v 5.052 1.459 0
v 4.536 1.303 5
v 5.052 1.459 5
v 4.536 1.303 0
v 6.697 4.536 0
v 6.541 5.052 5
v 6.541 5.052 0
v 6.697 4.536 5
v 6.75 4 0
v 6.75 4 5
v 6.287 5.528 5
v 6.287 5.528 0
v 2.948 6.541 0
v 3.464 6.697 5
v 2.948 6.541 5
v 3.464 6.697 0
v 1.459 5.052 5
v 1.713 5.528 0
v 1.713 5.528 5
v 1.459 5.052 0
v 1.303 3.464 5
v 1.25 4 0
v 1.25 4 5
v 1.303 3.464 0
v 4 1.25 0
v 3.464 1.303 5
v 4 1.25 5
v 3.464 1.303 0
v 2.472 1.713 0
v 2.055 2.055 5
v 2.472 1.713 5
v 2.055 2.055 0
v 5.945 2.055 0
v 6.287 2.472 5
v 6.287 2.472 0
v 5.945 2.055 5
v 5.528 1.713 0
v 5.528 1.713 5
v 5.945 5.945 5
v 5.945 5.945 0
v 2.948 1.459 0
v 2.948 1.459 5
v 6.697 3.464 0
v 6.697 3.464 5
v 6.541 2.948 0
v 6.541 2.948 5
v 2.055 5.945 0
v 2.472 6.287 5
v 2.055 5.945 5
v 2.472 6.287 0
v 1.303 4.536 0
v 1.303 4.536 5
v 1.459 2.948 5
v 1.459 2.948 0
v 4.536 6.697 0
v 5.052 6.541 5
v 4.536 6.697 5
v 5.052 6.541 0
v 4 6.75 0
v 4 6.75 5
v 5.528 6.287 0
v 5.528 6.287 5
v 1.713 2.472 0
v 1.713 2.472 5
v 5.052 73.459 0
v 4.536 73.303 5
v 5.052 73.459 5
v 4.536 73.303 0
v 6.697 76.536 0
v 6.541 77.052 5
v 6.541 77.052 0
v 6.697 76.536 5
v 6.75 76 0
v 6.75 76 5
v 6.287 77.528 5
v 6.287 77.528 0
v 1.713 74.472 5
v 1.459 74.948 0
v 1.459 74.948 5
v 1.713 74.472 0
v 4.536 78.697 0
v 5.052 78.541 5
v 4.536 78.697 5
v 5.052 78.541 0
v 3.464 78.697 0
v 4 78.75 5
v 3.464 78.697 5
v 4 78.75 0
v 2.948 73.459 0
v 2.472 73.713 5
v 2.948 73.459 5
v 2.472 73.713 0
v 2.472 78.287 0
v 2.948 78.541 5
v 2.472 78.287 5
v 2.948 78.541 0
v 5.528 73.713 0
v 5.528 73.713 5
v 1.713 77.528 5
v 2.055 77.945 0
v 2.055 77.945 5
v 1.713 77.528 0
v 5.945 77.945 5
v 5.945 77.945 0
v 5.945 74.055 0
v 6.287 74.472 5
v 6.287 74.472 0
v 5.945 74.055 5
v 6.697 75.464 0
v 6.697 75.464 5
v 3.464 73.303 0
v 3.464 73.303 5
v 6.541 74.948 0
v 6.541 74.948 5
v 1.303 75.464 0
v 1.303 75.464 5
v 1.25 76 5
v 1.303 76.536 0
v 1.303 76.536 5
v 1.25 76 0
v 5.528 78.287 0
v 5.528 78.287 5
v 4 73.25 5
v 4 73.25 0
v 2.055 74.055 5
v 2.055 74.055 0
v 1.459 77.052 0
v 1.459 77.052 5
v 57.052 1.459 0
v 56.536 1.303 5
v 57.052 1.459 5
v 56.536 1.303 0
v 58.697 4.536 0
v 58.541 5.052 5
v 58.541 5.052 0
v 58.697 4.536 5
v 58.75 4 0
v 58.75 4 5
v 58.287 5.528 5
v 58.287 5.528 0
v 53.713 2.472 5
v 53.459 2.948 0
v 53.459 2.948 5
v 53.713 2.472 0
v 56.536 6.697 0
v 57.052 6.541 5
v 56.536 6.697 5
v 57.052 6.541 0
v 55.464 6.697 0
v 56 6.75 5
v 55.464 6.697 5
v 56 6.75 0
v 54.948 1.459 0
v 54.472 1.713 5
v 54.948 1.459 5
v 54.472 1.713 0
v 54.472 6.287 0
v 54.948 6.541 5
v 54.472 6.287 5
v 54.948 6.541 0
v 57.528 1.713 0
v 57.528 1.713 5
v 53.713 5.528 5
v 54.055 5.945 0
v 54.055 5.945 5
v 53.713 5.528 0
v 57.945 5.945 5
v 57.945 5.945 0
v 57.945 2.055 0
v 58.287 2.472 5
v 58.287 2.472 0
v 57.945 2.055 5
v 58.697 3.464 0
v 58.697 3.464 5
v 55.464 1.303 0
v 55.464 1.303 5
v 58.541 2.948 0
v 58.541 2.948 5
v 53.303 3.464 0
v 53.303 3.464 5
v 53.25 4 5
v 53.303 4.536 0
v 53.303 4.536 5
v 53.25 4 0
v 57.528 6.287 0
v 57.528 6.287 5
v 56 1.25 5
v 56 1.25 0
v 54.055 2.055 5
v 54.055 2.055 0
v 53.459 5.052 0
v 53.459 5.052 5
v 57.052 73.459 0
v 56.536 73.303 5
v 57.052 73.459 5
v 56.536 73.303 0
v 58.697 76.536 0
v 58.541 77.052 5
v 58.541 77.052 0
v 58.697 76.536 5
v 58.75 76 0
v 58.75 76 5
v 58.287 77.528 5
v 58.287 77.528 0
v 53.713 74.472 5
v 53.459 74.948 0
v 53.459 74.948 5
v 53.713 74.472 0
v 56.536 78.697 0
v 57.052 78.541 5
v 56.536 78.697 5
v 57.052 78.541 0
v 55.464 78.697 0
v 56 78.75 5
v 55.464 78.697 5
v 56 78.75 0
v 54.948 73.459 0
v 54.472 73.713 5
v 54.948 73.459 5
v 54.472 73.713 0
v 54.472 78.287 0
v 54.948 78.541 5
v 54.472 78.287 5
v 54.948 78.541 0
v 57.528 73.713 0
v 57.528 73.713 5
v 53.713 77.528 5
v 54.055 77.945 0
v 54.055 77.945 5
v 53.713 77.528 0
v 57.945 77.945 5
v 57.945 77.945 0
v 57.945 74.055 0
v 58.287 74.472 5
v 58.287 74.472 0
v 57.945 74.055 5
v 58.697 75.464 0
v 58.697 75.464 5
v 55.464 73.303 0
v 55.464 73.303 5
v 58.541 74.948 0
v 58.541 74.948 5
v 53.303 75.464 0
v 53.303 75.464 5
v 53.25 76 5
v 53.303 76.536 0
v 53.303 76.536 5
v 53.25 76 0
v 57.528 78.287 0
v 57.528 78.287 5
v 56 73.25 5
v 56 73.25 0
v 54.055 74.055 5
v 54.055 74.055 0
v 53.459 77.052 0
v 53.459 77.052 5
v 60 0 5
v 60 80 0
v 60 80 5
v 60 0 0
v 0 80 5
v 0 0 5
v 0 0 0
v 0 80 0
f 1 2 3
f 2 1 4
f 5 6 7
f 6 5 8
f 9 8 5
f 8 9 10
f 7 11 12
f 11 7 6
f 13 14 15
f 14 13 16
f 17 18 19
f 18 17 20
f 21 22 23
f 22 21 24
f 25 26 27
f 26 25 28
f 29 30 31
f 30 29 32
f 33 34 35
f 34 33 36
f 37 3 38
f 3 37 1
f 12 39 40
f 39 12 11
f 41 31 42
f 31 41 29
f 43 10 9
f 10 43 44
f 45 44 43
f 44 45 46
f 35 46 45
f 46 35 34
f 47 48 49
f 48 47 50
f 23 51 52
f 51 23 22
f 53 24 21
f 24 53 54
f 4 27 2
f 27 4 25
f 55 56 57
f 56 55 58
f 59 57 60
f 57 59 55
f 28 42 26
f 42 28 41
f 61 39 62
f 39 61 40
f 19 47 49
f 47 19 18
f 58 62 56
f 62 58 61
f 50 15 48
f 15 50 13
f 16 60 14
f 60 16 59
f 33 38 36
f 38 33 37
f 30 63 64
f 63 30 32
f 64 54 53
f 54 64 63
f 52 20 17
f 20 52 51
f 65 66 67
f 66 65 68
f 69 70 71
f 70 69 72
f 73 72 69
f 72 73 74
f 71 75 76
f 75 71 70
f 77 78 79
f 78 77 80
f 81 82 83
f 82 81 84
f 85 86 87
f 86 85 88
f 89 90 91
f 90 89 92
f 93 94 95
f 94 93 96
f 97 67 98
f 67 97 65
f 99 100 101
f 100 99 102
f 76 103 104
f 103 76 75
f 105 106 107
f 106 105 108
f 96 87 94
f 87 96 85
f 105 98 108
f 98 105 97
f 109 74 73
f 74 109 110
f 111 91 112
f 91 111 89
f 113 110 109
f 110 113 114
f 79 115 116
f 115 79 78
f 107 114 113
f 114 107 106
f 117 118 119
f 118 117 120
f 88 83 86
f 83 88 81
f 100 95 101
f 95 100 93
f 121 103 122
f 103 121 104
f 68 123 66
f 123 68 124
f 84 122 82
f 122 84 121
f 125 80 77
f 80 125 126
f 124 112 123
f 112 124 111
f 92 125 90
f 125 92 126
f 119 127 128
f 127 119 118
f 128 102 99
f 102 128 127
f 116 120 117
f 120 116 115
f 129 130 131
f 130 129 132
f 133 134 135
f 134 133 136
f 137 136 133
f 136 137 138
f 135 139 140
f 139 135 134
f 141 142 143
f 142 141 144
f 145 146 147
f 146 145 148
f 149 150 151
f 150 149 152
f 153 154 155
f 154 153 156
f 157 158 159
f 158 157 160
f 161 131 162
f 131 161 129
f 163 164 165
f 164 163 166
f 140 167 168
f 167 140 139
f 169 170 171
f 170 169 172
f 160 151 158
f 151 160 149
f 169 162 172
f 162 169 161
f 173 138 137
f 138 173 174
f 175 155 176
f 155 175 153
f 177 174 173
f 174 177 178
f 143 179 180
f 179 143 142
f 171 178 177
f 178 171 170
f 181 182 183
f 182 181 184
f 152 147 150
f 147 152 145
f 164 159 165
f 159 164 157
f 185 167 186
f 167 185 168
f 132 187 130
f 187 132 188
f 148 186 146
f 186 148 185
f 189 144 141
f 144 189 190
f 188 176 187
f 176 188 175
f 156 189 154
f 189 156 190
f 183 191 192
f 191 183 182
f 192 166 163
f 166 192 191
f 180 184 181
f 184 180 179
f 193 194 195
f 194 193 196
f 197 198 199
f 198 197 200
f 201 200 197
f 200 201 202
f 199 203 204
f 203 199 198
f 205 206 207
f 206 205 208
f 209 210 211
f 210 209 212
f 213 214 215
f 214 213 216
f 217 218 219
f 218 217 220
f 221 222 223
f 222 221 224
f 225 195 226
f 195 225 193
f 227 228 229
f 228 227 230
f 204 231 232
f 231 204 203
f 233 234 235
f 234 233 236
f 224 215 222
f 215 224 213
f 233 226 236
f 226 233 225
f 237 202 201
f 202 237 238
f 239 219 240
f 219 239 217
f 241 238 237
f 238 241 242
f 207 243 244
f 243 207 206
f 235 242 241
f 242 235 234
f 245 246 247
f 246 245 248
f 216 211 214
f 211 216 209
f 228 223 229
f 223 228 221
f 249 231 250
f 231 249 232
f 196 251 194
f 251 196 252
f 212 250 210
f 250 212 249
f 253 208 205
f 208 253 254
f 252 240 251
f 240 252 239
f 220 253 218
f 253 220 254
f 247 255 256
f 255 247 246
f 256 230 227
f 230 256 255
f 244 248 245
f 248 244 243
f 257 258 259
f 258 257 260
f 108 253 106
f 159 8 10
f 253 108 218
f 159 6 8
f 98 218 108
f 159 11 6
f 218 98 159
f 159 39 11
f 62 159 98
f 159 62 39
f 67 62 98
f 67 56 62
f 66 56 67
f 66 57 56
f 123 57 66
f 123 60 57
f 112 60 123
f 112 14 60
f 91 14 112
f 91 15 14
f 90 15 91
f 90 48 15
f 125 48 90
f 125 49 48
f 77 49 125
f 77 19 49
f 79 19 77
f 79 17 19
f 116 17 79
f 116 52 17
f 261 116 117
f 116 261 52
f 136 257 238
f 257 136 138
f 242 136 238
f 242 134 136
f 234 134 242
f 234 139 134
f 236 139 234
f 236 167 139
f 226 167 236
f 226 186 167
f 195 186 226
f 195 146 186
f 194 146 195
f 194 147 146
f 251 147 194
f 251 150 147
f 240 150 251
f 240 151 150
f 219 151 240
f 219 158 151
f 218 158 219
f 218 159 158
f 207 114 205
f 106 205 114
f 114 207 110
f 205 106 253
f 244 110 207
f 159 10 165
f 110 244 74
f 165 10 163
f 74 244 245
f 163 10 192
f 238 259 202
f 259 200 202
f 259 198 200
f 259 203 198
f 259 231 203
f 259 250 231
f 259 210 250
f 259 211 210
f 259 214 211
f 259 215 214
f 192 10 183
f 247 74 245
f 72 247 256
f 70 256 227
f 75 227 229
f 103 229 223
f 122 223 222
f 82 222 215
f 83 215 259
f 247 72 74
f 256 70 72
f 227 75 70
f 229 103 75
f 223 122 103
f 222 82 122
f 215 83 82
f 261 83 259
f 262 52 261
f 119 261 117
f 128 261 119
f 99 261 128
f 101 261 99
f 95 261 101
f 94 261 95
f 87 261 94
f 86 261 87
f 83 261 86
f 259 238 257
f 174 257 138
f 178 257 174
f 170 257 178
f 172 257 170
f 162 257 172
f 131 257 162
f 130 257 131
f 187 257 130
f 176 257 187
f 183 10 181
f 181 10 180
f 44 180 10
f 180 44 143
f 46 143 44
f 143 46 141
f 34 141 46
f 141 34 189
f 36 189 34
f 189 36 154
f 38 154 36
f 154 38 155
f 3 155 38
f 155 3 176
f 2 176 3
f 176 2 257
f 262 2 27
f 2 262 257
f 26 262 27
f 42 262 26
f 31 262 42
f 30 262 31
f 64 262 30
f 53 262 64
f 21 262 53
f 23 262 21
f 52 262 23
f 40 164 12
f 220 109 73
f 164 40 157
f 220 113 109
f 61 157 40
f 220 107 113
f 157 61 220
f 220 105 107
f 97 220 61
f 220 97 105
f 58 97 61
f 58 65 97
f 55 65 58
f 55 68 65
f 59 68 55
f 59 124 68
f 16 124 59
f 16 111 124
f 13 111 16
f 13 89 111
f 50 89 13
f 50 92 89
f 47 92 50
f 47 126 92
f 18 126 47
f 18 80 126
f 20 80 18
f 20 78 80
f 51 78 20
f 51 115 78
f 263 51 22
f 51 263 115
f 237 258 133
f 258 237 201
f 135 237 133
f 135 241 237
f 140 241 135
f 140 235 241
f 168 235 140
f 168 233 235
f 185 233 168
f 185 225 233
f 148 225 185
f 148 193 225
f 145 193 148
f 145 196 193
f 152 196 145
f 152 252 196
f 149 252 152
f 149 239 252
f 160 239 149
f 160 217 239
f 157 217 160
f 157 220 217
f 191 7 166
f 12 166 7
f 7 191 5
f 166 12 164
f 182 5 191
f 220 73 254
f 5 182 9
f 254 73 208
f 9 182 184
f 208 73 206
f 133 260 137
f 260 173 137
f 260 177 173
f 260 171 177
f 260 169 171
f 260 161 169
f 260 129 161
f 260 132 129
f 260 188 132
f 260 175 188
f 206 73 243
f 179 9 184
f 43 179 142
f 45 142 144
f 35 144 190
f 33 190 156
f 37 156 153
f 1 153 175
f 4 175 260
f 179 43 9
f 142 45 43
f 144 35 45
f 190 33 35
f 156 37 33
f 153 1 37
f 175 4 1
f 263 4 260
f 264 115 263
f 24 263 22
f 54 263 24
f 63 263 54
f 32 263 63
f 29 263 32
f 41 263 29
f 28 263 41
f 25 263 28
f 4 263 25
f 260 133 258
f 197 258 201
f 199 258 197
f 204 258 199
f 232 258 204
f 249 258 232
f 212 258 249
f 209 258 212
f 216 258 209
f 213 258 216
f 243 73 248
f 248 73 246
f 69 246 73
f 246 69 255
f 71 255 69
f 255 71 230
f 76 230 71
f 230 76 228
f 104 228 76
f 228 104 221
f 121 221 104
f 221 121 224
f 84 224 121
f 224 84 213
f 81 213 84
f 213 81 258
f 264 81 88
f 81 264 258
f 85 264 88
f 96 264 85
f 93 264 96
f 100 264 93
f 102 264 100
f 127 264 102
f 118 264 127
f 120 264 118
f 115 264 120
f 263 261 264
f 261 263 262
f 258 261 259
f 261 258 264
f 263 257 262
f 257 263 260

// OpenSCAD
$fn = 32;

// ----------------------------------------------------------------------
// Enclosure lid: 60 x 80 x 5 mm, 4 bolt holes
// ----------------------------------------------------------------------

// --- parameters (mm) ---
length = 60;              // lid length, X
width = 80;               // lid width, Y
plate_t = 5;              // lid plate thickness
bolt_d = 5.5;             // bolt clearance
boss_lip = 4;             // bolt hole inset from the corner
sink = 1;                 // overlap of the lip and ribs into the plate

module plate() {
  cube([length, width, plate_t]);
}

difference() {
  plate();
  /* bolt pattern matching the corner bosses */
  for (sx = [0, 1]) for (sy = [0, 1])
    translate([sx * (length - 2 * boss_lip) + boss_lip, sy * (width - 2 * boss_lip) + boss_lip, -0 - 1])
      cylinder(h = plate_t + 0 + 2, d = bolt_d);
}
